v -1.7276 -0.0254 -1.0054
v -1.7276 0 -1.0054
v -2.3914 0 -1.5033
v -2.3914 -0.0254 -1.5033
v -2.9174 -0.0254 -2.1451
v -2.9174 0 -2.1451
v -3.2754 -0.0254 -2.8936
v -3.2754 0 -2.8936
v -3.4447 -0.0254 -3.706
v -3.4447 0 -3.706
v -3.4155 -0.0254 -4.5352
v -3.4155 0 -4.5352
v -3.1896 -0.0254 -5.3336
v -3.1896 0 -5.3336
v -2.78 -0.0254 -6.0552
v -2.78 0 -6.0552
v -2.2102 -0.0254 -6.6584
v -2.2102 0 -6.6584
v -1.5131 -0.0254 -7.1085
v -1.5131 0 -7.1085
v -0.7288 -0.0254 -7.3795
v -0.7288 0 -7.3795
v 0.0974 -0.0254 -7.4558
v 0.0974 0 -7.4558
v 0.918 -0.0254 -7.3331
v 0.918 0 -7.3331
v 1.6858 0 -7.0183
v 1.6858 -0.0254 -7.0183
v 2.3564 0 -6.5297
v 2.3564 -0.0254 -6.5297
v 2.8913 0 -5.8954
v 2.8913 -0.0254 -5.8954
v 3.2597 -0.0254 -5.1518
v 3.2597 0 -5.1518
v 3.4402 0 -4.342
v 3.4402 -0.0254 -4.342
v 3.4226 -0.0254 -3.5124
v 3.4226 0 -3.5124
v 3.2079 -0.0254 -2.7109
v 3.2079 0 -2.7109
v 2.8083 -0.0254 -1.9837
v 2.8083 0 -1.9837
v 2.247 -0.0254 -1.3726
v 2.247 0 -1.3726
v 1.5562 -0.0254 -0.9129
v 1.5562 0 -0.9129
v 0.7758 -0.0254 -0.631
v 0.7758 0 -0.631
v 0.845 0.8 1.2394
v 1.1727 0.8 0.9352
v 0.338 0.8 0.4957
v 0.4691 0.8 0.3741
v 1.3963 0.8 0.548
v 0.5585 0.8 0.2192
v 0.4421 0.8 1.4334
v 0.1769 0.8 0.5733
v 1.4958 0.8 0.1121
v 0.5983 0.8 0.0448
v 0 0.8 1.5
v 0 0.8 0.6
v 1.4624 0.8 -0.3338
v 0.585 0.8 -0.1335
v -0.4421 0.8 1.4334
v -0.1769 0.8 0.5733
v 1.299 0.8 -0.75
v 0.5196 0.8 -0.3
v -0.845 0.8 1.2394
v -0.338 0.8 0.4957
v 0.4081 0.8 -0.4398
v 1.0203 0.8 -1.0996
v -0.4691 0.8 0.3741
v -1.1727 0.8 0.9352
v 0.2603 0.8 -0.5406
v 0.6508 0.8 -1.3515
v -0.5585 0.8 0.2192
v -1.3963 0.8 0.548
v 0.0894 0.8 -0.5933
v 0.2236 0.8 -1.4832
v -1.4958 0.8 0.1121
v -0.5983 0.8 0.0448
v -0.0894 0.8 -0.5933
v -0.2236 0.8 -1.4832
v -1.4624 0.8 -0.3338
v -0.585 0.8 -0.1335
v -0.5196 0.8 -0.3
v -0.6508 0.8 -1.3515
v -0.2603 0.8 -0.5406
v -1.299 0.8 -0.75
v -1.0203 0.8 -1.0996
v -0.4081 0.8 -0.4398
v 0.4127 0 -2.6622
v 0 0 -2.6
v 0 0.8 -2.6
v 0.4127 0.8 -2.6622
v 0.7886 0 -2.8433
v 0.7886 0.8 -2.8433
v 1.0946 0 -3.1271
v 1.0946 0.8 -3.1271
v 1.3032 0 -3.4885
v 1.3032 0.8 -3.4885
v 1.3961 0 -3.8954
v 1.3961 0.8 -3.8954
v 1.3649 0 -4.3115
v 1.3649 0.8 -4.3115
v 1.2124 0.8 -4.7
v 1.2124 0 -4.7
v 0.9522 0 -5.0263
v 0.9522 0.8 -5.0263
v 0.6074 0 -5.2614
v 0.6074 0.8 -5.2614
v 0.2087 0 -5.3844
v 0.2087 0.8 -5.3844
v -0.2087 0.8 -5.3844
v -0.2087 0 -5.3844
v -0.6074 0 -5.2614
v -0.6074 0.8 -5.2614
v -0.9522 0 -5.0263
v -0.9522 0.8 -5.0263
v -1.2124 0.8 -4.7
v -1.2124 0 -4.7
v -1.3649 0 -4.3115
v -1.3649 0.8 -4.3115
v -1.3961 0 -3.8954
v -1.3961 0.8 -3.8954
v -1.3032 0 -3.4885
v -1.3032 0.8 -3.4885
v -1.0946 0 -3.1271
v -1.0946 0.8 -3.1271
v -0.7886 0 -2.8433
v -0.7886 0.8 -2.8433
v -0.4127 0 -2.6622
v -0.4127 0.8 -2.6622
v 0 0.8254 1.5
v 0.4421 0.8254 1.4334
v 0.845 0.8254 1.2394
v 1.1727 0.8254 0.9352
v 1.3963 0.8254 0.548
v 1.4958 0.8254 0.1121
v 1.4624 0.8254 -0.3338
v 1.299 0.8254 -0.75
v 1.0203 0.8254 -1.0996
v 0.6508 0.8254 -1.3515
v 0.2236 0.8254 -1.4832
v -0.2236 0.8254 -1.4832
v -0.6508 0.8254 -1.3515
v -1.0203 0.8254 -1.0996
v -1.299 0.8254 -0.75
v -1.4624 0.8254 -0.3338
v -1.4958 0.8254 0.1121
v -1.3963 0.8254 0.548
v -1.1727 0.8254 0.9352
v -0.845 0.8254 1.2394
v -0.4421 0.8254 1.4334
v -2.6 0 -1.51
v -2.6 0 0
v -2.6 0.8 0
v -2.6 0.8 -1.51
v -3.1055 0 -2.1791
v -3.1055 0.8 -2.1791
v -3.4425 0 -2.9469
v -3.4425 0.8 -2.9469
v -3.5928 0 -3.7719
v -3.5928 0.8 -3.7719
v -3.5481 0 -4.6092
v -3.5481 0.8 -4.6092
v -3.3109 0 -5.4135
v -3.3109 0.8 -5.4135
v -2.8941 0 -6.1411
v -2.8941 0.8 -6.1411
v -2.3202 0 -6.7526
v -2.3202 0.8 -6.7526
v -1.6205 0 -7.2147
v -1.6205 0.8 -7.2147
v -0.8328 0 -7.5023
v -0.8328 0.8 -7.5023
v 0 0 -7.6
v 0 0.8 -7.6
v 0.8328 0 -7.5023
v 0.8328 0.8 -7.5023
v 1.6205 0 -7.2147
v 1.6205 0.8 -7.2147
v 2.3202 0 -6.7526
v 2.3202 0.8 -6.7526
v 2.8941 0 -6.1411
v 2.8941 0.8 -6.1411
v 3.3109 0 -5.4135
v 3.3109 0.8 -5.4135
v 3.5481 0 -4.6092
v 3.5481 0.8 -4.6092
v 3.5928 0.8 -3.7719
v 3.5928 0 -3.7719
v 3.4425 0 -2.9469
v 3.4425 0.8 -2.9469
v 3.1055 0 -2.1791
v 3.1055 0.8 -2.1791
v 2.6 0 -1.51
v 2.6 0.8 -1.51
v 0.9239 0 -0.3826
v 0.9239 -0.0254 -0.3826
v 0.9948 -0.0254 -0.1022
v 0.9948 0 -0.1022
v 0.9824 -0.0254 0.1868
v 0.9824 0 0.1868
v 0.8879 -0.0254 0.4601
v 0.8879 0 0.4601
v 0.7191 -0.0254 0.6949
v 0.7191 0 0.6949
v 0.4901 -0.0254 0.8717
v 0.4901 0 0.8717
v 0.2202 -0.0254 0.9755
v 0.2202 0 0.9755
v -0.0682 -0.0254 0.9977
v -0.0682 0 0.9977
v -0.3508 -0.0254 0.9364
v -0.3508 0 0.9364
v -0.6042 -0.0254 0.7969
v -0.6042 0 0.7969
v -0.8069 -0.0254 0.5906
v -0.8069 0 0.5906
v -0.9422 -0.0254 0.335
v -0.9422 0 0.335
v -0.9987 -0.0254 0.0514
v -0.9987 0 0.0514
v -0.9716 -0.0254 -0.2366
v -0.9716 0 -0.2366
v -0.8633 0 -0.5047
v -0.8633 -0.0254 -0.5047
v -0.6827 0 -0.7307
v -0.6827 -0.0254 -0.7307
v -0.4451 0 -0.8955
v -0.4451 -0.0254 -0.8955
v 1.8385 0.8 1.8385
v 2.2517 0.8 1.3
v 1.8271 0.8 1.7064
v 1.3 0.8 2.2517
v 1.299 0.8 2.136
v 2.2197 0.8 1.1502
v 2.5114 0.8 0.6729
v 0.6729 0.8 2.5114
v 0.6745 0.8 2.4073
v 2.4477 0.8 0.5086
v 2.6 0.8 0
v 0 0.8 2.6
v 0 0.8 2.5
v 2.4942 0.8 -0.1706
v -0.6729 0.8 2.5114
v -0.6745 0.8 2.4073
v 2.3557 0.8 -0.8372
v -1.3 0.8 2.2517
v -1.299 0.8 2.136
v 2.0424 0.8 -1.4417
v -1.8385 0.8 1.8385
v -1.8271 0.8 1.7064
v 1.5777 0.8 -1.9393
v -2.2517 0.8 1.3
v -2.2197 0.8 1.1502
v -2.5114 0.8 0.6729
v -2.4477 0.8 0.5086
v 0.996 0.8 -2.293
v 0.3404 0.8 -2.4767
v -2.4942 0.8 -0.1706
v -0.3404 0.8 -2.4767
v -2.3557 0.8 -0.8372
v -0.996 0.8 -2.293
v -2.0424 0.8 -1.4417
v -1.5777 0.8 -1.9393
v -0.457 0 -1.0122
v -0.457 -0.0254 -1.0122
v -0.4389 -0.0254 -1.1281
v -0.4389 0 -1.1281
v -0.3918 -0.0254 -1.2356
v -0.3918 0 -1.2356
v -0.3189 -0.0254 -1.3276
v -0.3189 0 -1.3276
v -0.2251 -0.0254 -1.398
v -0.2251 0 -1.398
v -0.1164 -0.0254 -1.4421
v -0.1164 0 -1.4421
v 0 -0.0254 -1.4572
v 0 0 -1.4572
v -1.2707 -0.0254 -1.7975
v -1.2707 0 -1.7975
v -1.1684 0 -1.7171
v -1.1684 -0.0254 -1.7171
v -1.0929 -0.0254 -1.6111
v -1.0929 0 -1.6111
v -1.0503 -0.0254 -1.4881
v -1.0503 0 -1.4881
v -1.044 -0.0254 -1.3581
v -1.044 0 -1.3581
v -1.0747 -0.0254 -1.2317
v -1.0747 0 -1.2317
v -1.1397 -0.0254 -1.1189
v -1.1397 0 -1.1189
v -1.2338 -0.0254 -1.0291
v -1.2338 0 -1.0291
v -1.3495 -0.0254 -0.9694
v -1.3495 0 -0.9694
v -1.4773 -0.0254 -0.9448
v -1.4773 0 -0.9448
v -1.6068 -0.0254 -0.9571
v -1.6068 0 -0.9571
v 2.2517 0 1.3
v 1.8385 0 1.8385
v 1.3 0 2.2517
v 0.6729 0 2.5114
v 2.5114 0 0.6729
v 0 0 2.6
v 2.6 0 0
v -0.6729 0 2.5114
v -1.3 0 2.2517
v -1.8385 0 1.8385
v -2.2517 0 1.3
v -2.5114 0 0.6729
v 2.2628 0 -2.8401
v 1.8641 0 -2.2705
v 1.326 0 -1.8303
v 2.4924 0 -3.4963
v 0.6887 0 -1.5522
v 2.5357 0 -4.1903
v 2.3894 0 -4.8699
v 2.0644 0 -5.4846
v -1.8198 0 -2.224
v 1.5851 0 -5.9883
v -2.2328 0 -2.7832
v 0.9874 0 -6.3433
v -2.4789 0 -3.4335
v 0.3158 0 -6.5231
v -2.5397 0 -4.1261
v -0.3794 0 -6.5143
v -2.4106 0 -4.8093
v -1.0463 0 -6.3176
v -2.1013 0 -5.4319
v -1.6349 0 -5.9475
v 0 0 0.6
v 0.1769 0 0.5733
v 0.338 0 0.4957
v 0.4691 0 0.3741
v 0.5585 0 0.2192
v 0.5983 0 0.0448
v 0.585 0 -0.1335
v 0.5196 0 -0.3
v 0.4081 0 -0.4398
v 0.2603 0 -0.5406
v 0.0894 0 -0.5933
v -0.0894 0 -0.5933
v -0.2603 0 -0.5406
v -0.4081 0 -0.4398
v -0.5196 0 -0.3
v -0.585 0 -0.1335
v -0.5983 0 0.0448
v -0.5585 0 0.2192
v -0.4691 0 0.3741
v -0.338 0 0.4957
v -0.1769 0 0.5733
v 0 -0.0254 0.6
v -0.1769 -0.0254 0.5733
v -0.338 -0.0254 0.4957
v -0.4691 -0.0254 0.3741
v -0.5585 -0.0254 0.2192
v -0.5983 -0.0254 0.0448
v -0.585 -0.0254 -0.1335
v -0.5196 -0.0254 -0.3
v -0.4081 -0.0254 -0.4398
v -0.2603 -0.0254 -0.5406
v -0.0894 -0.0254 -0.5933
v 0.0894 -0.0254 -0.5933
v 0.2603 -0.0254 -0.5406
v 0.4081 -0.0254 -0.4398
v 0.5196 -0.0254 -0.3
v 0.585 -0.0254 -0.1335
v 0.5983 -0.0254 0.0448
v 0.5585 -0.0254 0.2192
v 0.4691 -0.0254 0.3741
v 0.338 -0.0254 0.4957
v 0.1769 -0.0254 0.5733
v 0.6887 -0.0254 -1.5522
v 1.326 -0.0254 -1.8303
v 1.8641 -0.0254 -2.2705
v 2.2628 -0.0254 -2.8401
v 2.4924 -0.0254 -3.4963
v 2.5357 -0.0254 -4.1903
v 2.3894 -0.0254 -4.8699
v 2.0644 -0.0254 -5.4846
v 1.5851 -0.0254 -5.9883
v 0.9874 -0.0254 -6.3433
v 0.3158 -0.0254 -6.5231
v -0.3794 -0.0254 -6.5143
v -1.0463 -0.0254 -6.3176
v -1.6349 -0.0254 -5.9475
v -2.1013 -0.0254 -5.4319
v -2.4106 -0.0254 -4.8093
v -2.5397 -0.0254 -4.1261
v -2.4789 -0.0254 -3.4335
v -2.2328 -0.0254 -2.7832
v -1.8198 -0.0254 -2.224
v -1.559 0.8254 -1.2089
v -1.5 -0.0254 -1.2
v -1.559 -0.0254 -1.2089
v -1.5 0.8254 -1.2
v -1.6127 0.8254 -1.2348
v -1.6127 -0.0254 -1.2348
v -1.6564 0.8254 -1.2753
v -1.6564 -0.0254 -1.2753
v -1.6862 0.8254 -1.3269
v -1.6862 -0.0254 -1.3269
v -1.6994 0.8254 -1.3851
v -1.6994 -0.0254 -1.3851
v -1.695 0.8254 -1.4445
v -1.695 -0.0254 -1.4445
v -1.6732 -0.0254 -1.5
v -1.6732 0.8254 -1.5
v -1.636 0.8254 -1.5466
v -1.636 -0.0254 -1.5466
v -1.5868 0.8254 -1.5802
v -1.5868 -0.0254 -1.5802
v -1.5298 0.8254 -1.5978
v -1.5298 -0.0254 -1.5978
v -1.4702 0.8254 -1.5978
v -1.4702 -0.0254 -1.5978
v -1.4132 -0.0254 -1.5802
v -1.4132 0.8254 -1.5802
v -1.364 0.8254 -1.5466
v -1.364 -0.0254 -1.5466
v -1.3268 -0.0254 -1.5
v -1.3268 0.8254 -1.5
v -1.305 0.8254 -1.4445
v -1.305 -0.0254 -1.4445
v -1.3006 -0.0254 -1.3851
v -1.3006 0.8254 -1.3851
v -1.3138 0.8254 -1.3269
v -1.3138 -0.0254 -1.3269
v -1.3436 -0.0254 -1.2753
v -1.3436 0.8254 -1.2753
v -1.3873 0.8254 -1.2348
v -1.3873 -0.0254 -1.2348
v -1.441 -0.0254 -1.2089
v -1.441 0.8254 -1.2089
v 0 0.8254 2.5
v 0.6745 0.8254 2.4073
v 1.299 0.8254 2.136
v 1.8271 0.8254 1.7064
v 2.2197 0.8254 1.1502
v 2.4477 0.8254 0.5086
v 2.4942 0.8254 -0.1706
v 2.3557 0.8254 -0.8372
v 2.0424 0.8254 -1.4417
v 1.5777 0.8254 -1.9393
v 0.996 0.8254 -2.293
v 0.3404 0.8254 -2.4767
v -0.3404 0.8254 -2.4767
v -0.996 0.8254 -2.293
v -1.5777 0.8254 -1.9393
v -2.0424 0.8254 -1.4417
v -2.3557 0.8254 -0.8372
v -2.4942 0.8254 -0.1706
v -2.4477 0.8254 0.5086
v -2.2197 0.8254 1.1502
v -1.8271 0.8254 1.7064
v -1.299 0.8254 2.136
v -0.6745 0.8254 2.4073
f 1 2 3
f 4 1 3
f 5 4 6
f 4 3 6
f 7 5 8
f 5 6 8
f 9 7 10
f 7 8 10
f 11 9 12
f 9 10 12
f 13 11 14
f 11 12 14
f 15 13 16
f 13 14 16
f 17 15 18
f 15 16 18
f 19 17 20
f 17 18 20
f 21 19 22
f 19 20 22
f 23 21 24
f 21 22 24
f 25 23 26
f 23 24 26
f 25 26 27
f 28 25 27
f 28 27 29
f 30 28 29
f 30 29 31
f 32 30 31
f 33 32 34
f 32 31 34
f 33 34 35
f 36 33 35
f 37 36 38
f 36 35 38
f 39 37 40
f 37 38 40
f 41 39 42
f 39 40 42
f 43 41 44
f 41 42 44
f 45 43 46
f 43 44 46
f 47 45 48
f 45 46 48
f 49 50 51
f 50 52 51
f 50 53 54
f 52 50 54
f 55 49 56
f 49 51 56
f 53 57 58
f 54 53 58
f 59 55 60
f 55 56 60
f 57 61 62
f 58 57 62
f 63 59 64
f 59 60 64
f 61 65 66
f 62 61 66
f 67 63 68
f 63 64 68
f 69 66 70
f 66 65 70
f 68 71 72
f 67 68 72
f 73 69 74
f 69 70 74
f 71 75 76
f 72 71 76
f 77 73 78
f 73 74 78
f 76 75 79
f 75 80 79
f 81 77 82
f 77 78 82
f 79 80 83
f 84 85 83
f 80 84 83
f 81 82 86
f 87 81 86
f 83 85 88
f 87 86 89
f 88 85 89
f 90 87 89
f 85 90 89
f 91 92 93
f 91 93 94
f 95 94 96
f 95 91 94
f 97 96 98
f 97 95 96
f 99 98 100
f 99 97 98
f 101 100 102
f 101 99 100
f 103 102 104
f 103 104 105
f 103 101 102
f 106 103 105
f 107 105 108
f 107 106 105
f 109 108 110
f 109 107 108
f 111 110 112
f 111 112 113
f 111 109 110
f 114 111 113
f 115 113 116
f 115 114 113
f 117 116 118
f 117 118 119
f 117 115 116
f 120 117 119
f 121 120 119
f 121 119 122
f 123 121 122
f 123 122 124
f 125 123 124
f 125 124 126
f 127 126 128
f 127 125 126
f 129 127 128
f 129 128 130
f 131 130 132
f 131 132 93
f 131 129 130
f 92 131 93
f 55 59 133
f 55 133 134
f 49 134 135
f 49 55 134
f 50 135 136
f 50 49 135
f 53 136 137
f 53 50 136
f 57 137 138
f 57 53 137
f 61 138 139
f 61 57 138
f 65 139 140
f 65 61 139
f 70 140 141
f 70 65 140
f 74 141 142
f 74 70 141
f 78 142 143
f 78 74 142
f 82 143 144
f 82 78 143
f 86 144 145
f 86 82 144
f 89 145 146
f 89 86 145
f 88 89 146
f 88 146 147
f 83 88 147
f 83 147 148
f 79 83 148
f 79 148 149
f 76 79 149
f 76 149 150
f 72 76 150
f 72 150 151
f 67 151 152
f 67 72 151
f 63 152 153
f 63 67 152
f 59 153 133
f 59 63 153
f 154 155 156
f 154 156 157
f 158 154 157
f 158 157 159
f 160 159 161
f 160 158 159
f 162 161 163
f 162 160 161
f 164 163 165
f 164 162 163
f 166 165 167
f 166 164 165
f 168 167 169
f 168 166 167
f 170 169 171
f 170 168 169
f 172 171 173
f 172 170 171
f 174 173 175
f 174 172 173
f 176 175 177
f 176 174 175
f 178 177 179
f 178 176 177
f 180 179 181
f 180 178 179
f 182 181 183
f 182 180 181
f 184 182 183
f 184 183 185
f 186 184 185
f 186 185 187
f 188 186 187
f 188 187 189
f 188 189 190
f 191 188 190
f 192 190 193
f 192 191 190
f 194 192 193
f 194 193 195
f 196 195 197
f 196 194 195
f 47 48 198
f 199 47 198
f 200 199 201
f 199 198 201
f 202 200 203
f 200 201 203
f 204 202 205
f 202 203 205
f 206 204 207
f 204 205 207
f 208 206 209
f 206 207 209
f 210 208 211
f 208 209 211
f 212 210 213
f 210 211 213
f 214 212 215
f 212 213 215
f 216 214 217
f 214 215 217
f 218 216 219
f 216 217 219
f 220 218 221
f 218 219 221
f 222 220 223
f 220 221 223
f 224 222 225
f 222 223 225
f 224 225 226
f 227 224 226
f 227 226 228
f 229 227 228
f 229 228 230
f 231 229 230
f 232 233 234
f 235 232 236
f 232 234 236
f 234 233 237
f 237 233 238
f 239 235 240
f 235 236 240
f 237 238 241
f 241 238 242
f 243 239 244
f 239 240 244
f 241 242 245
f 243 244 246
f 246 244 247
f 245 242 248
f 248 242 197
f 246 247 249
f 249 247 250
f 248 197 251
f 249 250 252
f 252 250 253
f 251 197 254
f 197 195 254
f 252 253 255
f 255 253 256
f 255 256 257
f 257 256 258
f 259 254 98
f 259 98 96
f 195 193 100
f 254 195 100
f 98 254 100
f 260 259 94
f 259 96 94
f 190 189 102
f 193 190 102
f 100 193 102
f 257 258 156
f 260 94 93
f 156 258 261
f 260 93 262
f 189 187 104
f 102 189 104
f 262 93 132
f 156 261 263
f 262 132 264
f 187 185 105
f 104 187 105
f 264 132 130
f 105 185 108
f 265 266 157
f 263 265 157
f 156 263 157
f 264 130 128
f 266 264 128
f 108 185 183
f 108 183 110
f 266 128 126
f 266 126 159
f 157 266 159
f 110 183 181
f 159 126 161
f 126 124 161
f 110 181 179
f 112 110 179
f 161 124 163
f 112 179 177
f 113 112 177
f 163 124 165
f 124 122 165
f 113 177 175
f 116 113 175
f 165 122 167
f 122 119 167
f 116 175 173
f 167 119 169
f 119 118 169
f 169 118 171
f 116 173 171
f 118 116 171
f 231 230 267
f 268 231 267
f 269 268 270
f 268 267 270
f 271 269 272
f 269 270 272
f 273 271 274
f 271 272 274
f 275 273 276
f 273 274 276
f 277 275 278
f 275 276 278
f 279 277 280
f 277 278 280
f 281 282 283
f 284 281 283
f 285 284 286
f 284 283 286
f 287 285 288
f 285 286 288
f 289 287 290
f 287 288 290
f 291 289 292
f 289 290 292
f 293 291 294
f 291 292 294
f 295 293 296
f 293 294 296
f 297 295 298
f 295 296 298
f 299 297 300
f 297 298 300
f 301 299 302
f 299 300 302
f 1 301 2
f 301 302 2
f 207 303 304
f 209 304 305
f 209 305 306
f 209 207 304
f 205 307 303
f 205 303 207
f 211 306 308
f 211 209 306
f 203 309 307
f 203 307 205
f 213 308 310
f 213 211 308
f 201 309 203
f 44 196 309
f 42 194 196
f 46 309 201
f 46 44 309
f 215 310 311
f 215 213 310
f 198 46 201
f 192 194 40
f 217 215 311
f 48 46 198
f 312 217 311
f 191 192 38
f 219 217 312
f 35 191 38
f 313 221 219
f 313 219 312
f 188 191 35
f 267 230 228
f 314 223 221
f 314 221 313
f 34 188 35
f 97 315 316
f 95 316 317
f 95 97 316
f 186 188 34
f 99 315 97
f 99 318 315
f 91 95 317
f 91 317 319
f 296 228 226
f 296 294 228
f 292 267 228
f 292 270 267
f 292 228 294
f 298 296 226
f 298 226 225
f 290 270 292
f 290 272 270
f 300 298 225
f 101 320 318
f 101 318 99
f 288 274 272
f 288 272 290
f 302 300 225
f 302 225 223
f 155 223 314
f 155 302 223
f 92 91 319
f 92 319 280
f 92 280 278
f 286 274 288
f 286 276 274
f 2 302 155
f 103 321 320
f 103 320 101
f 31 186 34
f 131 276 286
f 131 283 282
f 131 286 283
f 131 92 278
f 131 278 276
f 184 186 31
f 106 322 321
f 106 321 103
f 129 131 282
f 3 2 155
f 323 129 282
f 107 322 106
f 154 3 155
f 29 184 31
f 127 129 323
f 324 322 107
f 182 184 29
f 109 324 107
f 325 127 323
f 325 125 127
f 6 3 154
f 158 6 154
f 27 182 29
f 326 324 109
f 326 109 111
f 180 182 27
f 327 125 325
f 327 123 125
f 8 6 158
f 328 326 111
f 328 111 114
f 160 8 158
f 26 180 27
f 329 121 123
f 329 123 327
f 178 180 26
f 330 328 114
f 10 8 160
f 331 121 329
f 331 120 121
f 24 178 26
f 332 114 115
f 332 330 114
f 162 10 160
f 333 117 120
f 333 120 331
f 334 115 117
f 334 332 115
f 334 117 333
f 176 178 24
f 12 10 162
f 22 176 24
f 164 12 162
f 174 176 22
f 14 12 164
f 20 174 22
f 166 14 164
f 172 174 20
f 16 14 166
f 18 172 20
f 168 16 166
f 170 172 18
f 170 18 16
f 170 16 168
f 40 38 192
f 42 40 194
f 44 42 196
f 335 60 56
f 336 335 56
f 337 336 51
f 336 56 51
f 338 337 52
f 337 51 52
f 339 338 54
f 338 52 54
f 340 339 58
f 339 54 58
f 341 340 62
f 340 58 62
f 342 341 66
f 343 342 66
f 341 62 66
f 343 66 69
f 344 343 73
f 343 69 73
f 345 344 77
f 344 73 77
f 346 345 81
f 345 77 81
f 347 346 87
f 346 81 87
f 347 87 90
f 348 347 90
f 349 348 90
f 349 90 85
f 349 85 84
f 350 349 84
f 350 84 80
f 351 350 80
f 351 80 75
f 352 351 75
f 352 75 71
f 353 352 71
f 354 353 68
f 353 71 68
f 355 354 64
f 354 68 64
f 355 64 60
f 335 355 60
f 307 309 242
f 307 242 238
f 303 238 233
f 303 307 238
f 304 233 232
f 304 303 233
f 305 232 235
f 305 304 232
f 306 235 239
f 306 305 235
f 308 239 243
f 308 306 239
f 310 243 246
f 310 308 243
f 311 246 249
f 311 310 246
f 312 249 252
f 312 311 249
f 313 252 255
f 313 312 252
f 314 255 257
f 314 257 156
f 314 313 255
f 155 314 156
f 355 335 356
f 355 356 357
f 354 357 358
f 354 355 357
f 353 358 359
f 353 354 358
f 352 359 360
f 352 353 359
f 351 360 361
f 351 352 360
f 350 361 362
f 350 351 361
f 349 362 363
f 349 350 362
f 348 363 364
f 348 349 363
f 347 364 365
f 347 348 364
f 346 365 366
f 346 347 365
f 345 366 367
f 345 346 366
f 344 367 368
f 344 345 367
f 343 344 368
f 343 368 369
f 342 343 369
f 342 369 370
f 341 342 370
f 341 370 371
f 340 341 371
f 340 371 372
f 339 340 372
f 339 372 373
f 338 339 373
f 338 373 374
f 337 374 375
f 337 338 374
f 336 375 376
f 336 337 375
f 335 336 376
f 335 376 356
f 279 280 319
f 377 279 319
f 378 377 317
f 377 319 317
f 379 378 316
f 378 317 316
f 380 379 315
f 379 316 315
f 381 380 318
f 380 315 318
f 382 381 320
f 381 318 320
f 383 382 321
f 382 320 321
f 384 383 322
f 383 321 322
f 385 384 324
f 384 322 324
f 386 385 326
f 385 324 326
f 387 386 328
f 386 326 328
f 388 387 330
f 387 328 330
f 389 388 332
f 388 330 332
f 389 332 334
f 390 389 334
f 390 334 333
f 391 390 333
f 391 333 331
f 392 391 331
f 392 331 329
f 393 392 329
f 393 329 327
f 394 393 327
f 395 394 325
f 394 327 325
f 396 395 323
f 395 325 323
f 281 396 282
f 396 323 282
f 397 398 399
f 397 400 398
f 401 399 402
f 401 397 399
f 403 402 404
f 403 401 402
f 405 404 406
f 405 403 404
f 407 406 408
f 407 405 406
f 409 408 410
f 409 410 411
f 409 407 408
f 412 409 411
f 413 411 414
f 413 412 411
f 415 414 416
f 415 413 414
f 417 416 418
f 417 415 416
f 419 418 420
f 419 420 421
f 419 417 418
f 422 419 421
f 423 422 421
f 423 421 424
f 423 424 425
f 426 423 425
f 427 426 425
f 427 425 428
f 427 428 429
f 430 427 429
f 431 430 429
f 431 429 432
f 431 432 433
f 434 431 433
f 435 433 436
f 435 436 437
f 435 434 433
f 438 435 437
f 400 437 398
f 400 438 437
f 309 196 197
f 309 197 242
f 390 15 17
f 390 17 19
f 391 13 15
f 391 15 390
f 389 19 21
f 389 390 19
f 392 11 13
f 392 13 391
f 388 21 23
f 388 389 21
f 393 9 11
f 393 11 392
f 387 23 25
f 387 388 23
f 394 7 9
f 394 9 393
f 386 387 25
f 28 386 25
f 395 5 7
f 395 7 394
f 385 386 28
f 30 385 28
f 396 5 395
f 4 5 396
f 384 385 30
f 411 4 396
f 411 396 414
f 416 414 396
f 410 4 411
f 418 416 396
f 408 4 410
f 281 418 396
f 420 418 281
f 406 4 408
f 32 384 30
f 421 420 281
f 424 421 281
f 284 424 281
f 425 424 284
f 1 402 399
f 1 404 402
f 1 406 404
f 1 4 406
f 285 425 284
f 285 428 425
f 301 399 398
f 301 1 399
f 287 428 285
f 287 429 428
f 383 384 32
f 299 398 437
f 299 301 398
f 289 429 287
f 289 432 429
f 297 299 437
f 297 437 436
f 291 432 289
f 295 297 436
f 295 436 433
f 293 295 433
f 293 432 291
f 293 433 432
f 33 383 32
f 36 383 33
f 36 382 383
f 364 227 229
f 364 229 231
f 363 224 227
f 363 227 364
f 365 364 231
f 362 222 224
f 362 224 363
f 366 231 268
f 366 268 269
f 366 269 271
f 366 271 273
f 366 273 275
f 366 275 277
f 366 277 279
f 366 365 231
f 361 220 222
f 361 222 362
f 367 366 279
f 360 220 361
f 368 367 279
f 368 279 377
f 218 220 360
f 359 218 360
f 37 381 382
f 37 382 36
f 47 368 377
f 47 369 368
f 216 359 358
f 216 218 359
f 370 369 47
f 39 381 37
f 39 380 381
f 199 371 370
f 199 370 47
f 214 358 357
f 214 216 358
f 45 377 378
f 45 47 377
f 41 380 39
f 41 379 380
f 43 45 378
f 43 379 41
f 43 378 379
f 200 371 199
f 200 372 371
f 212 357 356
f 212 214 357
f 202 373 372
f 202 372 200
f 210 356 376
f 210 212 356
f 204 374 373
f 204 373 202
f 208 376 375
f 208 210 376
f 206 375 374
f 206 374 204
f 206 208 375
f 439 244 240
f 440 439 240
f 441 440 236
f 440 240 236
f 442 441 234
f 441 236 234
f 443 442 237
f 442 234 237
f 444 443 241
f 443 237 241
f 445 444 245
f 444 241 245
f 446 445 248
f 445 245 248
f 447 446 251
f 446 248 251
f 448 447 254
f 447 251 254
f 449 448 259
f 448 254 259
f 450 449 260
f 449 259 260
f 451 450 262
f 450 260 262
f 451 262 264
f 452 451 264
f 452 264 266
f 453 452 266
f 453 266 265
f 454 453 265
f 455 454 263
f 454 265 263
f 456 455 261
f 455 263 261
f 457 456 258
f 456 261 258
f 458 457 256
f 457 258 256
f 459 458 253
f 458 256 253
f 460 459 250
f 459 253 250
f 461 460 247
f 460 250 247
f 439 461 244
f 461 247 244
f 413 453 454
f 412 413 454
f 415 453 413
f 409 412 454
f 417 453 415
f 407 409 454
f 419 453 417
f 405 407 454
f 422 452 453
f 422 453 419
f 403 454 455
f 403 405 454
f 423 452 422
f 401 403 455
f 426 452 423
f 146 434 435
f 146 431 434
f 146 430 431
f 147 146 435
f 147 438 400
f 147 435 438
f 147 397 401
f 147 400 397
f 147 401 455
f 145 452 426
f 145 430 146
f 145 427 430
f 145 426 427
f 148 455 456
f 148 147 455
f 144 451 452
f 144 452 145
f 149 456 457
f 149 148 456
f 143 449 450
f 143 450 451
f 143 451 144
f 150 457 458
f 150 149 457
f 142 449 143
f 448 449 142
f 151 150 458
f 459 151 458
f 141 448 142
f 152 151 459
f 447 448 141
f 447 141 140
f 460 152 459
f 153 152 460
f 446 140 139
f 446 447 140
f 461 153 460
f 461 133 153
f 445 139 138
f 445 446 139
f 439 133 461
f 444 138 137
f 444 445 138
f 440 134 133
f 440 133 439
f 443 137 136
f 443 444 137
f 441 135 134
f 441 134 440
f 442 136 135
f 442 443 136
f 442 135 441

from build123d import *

# Parameters (mm, degrees)
SKETCH1_R           = 1.4
BOSS_EXTRUDE1_DEPTH = 0.8
SKETCH2_R           = 0.6
SKETCH2_R_2         = 0.2
CUT_EXTRUDE1_DEPTH  = 0.8
SKETCH3_R           = 2.5
SKETCH3_R_2         = 1.5
SKETCH3_R_3         = 0.2
BOSS_EXTRUDE2_DEPTH = 0.0254
SKETCH4_R           = 0.6
SKETCH4_R_2         = 0.2
BOSS_EXTRUDE3_DEPTH = 0.0254


with BuildPart() as part:
    # Sketch1 → Boss-Extrude1 (new body)
    with BuildSketch(Plane(origin=(0, 0, 0), x_dir=(1, 0, 0), z_dir=(0, 1, 0))):
        with BuildLine():
            Line((-2.6, 0), (-2.6, 1.51002008))
            ThreePointArc((-2.6, 1.51002008), (0, 7.6), (2.6, 1.51002008))
            Line((2.6, 1.51002008), (2.6, 0))
            ThreePointArc((2.6, 0), (0, -2.6), (-2.6, 0))
        make_face()
        with Locations(Location((0, 4, 0), (0, 0, 270))):
            Circle(SKETCH1_R, mode=Mode.SUBTRACT)
    extrude(amount=BOSS_EXTRUDE1_DEPTH)

    # Sketch2 → Cut-Extrude1 (cut)
    with BuildSketch(Plane(origin=(0, 0.8, 0), x_dir=(1, 0, 0), z_dir=(0, 1, 0))):
        with Locations(Location((0, 0, 0), (0, 0, 270))):
            Circle(SKETCH2_R)
        with Locations(Location((-1.5, 1.4, 0), (0, 0, 270))):
            Circle(SKETCH2_R_2)
    extrude(amount=-CUT_EXTRUDE1_DEPTH, mode=Mode.SUBTRACT)

    # Sketch3 → Boss-Extrude2 (add)
    with BuildSketch(Plane(origin=(0, 0.8, 0), x_dir=(1, 0, 0), z_dir=(0, 1, 0))):
        with Locations(Location((0, 0, 0), (0, 0, 270))):
            Circle(SKETCH3_R)
        with Locations(Location((0, 0, 0), (0, 0, 270))):
            Circle(SKETCH3_R_2, mode=Mode.SUBTRACT)
        with Locations(Location((-1.5, 1.4, 0), (0, 0, 270))):
            Circle(SKETCH3_R_3, mode=Mode.SUBTRACT)
    extrude(amount=BOSS_EXTRUDE2_DEPTH)

    # Sketch4 → Boss-Extrude3 (add)
    with BuildSketch(Plane.XZ):
        with BuildLine():
            ThreePointArc((-1.270694255, -1.797463292), (-1.103147311, -1.172970136), (-1.727640466, -1.005423192))
            ThreePointArc((-1.727640466, -1.005423192), (0.511420208, -7.419163817), (0.775806401, -0.63097102))
            ThreePointArc((0.775806401, -0.63097102), (-0.211741678, 0.977325668), (-0.445093544, -0.89548408))
            ThreePointArc((-0.445093544, -0.89548408), (-0.358340982, -1.283942918), (0, -1.4572))
            ThreePointArc((0, -1.4572), (0.657731518, -6.456261609), (-1.270694255, -1.797463292))
        make_face()
        with Locations(Location((0, 0, 0), (0, 0, 90))):
            Circle(SKETCH4_R, mode=Mode.SUBTRACT)
        with Locations(Location((-1.5, -1.4, 0), (0, 0, 90))):
            Circle(SKETCH4_R_2, mode=Mode.SUBTRACT)
    extrude(amount=BOSS_EXTRUDE3_DEPTH)


solid = part.part
